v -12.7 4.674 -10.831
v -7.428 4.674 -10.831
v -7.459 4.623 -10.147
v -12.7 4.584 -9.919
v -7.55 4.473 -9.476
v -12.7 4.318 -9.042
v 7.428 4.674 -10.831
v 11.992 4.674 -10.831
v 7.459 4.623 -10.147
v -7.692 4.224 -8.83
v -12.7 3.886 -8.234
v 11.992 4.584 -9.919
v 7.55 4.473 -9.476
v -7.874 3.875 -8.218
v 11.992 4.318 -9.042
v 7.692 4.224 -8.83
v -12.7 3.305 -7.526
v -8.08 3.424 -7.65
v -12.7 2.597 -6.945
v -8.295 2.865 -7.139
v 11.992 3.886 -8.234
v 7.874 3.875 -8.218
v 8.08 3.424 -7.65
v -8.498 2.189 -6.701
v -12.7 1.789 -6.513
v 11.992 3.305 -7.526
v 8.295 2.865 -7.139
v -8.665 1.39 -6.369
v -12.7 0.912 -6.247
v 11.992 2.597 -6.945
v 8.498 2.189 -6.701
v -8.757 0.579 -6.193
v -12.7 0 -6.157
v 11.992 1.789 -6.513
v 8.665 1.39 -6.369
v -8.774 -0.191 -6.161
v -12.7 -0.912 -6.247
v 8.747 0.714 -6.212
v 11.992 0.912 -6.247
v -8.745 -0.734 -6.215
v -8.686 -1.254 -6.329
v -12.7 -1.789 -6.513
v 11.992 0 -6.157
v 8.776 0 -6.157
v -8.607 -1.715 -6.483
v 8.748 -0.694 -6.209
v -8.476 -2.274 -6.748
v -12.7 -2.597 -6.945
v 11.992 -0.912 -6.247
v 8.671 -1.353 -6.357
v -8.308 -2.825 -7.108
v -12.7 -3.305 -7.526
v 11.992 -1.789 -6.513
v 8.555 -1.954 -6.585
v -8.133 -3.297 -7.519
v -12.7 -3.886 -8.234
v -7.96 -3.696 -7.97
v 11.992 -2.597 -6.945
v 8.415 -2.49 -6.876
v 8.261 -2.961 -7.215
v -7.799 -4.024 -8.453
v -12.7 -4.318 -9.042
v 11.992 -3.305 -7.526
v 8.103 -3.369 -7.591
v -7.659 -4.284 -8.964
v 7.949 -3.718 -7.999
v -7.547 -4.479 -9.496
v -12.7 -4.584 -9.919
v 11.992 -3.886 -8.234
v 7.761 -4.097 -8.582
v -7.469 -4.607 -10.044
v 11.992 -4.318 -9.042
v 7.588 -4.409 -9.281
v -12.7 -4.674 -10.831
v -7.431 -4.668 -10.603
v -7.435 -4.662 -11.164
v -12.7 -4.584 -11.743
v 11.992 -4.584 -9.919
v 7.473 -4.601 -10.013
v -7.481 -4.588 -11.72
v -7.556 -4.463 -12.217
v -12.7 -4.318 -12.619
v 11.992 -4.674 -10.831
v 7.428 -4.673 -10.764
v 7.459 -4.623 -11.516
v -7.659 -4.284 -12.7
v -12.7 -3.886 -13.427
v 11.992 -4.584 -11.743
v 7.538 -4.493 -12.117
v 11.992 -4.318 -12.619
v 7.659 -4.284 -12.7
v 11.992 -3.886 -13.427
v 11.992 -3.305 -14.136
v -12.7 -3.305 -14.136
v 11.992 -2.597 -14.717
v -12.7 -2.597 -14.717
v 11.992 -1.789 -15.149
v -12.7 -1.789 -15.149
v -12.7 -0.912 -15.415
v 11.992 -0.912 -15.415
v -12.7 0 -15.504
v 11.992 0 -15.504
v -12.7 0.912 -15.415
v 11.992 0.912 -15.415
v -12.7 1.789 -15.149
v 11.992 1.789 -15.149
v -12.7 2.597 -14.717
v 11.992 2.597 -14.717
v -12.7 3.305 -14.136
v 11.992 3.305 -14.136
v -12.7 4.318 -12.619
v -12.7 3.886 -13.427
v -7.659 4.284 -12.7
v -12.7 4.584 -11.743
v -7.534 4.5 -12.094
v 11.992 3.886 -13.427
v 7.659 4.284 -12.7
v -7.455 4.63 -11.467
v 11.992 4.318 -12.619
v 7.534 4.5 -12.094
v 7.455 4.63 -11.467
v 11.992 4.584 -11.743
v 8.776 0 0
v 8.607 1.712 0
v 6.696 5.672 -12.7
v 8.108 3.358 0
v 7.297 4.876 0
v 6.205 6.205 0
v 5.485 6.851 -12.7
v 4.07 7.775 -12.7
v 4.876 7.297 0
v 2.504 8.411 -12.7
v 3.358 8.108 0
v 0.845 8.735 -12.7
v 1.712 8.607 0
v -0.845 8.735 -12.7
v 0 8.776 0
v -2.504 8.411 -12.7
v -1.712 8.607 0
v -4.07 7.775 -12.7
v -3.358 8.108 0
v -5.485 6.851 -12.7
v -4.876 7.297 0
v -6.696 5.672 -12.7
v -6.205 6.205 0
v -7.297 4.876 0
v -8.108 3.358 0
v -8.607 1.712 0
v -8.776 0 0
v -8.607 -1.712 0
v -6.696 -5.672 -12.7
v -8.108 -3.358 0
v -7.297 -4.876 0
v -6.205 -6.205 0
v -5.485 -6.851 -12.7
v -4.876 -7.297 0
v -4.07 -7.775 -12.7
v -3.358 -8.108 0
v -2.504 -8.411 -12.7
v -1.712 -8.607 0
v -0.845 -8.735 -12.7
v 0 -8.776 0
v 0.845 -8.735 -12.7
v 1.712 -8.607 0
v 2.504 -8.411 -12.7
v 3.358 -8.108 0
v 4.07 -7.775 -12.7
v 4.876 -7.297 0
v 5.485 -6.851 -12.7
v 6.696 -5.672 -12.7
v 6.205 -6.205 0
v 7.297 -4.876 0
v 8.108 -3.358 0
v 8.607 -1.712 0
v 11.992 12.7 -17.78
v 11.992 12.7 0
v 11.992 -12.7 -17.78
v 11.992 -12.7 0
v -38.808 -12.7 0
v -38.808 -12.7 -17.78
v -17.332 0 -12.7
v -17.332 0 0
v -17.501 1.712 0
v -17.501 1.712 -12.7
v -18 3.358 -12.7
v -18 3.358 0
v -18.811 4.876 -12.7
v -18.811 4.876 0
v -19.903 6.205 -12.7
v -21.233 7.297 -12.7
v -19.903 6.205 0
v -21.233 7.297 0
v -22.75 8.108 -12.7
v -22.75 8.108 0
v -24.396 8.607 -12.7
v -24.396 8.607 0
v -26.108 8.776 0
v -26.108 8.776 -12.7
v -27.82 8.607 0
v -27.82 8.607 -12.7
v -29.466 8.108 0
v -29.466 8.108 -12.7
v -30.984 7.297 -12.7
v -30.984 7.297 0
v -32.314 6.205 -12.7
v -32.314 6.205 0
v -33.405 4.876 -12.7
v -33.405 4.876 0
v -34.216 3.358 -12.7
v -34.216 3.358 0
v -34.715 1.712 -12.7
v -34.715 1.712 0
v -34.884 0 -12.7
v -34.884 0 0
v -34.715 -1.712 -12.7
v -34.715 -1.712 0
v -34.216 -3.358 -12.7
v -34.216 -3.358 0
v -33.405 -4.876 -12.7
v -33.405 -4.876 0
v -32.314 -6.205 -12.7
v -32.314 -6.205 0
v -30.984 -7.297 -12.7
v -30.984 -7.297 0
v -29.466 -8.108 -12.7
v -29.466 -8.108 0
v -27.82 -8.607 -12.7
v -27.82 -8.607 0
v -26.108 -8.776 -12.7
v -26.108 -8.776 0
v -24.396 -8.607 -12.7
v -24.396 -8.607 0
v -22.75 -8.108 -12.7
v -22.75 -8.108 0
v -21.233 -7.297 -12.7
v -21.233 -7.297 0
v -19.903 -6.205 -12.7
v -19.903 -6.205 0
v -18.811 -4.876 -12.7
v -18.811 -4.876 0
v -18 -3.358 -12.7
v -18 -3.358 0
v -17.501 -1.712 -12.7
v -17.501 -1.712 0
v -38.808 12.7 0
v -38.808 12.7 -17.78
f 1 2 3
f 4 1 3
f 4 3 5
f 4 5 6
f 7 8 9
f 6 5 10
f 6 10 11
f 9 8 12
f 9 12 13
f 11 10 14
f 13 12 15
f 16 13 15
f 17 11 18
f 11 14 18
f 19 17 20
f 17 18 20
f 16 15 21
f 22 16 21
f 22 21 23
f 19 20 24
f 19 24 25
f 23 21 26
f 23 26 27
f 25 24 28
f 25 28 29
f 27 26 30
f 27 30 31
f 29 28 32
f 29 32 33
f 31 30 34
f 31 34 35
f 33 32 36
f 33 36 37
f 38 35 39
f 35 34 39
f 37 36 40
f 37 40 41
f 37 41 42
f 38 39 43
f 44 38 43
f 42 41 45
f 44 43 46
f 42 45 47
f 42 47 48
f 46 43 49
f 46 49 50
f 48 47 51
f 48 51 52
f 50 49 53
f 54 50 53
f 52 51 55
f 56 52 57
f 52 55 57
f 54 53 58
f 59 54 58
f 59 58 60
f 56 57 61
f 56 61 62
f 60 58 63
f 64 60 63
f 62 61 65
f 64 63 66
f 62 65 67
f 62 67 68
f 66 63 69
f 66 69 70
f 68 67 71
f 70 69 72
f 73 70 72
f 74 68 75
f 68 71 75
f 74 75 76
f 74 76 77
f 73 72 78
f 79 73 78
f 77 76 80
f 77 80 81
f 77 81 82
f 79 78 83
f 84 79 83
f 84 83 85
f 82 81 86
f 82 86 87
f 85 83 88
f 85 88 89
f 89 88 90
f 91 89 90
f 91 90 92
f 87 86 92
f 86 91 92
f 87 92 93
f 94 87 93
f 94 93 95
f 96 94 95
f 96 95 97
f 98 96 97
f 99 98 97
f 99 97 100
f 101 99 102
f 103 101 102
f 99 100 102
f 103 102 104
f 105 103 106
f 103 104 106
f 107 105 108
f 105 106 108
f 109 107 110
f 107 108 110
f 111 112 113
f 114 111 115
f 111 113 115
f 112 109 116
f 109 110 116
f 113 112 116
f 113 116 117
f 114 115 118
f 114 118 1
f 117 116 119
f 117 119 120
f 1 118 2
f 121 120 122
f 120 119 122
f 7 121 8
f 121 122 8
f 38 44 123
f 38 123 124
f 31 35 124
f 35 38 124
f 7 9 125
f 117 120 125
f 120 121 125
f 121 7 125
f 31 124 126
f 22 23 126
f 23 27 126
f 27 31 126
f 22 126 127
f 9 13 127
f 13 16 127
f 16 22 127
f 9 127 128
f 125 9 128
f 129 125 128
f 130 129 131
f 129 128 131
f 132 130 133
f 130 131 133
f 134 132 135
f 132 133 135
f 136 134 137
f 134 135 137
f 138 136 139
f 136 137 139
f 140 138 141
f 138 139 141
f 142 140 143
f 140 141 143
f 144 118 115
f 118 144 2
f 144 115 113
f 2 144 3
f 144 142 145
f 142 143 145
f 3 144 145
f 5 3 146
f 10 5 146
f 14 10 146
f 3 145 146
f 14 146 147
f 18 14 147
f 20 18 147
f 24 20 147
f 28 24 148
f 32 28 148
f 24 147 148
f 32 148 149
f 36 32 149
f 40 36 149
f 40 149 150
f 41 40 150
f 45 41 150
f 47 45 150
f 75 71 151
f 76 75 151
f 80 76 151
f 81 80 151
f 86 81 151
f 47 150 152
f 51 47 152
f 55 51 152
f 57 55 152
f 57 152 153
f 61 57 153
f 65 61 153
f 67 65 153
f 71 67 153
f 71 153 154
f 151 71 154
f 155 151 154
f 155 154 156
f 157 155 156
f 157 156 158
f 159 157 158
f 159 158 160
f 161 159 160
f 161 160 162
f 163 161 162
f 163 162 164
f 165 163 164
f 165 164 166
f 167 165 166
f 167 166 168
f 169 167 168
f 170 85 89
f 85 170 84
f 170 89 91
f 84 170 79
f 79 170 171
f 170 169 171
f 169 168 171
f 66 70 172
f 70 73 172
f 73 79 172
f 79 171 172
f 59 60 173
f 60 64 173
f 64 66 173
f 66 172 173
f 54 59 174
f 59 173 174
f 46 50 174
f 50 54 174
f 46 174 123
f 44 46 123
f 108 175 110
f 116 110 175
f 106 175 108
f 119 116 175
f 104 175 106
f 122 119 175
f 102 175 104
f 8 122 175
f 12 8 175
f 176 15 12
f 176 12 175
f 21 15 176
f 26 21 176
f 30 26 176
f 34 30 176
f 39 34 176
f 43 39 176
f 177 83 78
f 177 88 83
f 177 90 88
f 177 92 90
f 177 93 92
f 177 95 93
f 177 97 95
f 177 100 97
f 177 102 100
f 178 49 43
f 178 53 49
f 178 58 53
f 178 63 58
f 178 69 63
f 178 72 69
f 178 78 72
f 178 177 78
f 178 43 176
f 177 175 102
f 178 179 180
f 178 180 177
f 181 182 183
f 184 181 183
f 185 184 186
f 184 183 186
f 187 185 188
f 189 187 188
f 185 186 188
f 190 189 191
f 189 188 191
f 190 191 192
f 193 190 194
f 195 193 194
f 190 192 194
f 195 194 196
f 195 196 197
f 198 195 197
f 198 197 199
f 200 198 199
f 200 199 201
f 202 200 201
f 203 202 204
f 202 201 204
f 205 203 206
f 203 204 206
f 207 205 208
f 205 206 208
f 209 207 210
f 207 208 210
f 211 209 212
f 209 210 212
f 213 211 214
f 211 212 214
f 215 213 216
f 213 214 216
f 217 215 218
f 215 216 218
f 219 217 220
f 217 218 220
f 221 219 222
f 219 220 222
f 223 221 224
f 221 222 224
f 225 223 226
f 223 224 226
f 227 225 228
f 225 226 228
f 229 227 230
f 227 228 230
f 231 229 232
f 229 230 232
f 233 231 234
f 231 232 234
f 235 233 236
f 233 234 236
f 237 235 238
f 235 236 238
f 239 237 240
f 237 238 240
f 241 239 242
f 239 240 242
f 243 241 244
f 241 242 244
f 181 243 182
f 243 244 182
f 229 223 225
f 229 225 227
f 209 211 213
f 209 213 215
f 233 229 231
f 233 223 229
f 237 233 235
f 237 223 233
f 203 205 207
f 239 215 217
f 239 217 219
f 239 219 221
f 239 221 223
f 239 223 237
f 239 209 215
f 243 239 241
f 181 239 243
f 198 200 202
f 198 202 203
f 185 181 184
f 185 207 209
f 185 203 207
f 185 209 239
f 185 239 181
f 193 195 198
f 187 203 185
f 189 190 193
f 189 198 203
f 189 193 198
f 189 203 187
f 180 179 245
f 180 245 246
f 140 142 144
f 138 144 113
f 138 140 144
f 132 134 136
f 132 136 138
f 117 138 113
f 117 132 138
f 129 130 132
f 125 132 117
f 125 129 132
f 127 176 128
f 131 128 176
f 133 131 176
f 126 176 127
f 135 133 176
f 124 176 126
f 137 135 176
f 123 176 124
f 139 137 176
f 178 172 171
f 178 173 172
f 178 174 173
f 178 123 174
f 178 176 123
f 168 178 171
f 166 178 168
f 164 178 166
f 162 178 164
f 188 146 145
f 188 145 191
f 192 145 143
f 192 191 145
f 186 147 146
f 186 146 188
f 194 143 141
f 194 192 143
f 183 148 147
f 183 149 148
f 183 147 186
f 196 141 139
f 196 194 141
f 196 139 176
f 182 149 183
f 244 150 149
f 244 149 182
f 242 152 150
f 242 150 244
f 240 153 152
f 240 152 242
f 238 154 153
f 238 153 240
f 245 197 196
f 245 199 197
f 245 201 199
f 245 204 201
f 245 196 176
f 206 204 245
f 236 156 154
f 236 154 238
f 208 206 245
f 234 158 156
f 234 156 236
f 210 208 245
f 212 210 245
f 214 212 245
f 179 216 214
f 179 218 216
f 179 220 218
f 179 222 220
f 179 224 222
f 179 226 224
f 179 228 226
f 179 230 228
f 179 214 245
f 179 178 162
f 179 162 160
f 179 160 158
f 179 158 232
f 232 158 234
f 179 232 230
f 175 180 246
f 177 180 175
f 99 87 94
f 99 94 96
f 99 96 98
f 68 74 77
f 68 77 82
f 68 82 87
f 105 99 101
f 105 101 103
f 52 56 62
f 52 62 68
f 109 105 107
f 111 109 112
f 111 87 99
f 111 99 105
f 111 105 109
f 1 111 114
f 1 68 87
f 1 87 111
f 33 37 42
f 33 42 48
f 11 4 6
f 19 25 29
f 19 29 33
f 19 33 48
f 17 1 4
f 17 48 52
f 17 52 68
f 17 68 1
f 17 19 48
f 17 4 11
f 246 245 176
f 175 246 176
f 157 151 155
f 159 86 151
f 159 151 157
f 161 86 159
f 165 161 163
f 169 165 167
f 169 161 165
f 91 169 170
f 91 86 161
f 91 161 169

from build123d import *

# Parameters (mm, degrees)
F1_DEPTH = 12.7
F2_R     = 8.7757
F3_DEPTH = 12.7
F4_R     = 4.6736
F5_DEPTH = 12.7


with BuildPart() as f1:
    # F0 (on Front) → F1 (new body, symmetric)
    with BuildSketch(Plane.XZ):
        Polygon((11.991823, 0), (0, 0), (-38.808177, 0), (-38.808177, -17.78), (11.991823, -17.78), align=None)
    extrude(amount=F1_DEPTH, both=True)

    # F2 (on Top) → F3 (cut)
    with BuildSketch(Plane.XY):
        with Locations((-26.108177, 0)):
            Circle(F2_R)
        Circle(F2_R)
    extrude(amount=-F3_DEPTH, mode=Mode.SUBTRACT)

    # F4 (on Right) → F5 (cut, symmetric)
    with BuildSketch(Plane.YZ):
        with Locations((0, -10.830815)):
            Circle(F4_R)
    extrude(amount=F5_DEPTH, both=True, mode=Mode.SUBTRACT)


solid = f1.part
